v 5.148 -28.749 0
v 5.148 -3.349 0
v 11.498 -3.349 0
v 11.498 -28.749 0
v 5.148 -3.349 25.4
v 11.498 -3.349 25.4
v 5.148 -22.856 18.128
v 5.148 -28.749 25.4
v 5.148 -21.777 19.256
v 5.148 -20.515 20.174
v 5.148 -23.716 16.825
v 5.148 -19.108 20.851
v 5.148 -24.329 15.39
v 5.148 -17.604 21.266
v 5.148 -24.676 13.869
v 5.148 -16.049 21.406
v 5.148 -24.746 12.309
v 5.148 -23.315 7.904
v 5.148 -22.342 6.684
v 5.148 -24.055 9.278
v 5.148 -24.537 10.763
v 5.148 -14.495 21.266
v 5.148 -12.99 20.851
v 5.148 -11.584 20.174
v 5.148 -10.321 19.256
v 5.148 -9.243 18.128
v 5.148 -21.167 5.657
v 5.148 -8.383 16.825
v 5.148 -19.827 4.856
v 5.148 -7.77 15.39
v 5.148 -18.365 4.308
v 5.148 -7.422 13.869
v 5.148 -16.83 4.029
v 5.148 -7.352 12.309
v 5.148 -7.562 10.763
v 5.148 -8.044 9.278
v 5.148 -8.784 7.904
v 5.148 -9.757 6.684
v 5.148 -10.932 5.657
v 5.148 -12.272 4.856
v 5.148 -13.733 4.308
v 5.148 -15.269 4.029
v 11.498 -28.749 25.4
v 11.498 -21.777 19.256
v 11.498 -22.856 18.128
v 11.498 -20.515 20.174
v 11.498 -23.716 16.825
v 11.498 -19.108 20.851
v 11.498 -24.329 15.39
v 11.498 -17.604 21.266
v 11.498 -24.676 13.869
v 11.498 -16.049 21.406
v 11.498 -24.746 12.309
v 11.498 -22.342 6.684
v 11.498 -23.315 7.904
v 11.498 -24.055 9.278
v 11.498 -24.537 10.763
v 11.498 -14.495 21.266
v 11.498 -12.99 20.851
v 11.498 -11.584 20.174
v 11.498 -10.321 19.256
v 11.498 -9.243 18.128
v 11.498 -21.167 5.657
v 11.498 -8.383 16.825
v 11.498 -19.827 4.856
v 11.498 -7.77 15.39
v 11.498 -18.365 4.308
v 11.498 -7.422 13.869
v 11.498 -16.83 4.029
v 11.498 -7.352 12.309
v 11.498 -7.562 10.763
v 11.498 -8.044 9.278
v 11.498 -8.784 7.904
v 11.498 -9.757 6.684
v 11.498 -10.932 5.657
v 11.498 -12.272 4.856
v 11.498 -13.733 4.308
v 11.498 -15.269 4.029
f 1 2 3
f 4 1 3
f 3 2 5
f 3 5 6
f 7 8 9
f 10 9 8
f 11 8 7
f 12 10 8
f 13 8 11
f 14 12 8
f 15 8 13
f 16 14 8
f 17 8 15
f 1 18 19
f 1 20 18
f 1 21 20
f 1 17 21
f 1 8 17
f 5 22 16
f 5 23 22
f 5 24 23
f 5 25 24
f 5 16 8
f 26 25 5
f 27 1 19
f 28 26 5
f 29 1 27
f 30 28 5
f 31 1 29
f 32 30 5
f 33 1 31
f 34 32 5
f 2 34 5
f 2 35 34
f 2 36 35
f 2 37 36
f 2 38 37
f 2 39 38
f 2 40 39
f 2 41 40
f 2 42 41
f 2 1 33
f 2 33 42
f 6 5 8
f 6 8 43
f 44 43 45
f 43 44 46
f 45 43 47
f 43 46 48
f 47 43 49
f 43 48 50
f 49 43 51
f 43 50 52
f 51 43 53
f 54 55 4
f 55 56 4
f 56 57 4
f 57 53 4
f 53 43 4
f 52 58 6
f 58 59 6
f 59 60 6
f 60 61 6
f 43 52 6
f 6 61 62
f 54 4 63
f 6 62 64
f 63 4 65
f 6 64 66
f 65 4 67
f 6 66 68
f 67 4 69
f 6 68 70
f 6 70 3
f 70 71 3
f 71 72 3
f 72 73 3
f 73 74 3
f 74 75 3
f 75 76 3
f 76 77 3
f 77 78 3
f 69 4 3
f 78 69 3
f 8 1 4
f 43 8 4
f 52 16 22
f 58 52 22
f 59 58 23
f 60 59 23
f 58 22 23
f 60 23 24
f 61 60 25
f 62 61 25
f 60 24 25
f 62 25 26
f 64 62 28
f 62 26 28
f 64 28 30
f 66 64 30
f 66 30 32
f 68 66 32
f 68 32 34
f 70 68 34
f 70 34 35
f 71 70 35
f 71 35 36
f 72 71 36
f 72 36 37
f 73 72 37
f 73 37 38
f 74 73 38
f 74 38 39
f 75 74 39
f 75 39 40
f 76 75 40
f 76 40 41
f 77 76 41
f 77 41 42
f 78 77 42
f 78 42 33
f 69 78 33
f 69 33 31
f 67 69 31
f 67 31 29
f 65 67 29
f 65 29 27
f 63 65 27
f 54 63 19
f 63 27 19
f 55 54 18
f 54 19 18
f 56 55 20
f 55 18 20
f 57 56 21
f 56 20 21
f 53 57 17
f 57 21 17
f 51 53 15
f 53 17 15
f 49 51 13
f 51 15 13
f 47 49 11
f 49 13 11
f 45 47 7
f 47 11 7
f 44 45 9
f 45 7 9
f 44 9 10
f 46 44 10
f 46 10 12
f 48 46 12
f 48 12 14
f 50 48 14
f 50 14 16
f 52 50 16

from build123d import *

# Parameters (mm, degrees)
SKETCH1_W           = 6.35
SKETCH1_H           = 25.4
BOSS_EXTRUDE1_DEPTH = 25.4
SKETCH4_R           = 6.441586538
CUT_EXTRUDE1_DEPTH  = 6.35
CUT_EXTRUDE2_REACH  = 8.35
SKETCH3_R           = 8.70585


with BuildPart() as part:
    # Sketch1 → Boss-Extrude1 (new body)
    with BuildSketch(Plane.XY):
        with Locations((8.322674216, -16.049389649)):
            Rectangle(SKETCH1_W, SKETCH1_H)
    extrude(amount=BOSS_EXTRUDE1_DEPTH)

    # Sketch4 → Cut-Extrude1 (cut)
    with BuildSketch(Plane.ZY.offset(-5.147674216)):
        with Locations((12.7, -16.049389649)):
            Circle(SKETCH4_R)
    extrude(amount=-CUT_EXTRUDE1_DEPTH, mode=Mode.SUBTRACT)

    # Sketch3 → Cut-Extrude2 (cut, up to next)
    with BuildSketch(Plane.ZY.offset(-5.147674216), mode=Mode.PRIVATE) as cut_extrude2_sk1:
        with Locations((12.7, -16.049389649)):
            Circle(SKETCH3_R)
    cut_extrude2_tool1 = extrude(cut_extrude2_sk1.sketch, amount=-CUT_EXTRUDE2_REACH, mode=Mode.PRIVATE) & part.part
    add(cut_extrude2_tool1.solids().sort_by_distance((5.147674, -16.04939, 12.7))[0], mode=Mode.SUBTRACT)


solid = part.part
